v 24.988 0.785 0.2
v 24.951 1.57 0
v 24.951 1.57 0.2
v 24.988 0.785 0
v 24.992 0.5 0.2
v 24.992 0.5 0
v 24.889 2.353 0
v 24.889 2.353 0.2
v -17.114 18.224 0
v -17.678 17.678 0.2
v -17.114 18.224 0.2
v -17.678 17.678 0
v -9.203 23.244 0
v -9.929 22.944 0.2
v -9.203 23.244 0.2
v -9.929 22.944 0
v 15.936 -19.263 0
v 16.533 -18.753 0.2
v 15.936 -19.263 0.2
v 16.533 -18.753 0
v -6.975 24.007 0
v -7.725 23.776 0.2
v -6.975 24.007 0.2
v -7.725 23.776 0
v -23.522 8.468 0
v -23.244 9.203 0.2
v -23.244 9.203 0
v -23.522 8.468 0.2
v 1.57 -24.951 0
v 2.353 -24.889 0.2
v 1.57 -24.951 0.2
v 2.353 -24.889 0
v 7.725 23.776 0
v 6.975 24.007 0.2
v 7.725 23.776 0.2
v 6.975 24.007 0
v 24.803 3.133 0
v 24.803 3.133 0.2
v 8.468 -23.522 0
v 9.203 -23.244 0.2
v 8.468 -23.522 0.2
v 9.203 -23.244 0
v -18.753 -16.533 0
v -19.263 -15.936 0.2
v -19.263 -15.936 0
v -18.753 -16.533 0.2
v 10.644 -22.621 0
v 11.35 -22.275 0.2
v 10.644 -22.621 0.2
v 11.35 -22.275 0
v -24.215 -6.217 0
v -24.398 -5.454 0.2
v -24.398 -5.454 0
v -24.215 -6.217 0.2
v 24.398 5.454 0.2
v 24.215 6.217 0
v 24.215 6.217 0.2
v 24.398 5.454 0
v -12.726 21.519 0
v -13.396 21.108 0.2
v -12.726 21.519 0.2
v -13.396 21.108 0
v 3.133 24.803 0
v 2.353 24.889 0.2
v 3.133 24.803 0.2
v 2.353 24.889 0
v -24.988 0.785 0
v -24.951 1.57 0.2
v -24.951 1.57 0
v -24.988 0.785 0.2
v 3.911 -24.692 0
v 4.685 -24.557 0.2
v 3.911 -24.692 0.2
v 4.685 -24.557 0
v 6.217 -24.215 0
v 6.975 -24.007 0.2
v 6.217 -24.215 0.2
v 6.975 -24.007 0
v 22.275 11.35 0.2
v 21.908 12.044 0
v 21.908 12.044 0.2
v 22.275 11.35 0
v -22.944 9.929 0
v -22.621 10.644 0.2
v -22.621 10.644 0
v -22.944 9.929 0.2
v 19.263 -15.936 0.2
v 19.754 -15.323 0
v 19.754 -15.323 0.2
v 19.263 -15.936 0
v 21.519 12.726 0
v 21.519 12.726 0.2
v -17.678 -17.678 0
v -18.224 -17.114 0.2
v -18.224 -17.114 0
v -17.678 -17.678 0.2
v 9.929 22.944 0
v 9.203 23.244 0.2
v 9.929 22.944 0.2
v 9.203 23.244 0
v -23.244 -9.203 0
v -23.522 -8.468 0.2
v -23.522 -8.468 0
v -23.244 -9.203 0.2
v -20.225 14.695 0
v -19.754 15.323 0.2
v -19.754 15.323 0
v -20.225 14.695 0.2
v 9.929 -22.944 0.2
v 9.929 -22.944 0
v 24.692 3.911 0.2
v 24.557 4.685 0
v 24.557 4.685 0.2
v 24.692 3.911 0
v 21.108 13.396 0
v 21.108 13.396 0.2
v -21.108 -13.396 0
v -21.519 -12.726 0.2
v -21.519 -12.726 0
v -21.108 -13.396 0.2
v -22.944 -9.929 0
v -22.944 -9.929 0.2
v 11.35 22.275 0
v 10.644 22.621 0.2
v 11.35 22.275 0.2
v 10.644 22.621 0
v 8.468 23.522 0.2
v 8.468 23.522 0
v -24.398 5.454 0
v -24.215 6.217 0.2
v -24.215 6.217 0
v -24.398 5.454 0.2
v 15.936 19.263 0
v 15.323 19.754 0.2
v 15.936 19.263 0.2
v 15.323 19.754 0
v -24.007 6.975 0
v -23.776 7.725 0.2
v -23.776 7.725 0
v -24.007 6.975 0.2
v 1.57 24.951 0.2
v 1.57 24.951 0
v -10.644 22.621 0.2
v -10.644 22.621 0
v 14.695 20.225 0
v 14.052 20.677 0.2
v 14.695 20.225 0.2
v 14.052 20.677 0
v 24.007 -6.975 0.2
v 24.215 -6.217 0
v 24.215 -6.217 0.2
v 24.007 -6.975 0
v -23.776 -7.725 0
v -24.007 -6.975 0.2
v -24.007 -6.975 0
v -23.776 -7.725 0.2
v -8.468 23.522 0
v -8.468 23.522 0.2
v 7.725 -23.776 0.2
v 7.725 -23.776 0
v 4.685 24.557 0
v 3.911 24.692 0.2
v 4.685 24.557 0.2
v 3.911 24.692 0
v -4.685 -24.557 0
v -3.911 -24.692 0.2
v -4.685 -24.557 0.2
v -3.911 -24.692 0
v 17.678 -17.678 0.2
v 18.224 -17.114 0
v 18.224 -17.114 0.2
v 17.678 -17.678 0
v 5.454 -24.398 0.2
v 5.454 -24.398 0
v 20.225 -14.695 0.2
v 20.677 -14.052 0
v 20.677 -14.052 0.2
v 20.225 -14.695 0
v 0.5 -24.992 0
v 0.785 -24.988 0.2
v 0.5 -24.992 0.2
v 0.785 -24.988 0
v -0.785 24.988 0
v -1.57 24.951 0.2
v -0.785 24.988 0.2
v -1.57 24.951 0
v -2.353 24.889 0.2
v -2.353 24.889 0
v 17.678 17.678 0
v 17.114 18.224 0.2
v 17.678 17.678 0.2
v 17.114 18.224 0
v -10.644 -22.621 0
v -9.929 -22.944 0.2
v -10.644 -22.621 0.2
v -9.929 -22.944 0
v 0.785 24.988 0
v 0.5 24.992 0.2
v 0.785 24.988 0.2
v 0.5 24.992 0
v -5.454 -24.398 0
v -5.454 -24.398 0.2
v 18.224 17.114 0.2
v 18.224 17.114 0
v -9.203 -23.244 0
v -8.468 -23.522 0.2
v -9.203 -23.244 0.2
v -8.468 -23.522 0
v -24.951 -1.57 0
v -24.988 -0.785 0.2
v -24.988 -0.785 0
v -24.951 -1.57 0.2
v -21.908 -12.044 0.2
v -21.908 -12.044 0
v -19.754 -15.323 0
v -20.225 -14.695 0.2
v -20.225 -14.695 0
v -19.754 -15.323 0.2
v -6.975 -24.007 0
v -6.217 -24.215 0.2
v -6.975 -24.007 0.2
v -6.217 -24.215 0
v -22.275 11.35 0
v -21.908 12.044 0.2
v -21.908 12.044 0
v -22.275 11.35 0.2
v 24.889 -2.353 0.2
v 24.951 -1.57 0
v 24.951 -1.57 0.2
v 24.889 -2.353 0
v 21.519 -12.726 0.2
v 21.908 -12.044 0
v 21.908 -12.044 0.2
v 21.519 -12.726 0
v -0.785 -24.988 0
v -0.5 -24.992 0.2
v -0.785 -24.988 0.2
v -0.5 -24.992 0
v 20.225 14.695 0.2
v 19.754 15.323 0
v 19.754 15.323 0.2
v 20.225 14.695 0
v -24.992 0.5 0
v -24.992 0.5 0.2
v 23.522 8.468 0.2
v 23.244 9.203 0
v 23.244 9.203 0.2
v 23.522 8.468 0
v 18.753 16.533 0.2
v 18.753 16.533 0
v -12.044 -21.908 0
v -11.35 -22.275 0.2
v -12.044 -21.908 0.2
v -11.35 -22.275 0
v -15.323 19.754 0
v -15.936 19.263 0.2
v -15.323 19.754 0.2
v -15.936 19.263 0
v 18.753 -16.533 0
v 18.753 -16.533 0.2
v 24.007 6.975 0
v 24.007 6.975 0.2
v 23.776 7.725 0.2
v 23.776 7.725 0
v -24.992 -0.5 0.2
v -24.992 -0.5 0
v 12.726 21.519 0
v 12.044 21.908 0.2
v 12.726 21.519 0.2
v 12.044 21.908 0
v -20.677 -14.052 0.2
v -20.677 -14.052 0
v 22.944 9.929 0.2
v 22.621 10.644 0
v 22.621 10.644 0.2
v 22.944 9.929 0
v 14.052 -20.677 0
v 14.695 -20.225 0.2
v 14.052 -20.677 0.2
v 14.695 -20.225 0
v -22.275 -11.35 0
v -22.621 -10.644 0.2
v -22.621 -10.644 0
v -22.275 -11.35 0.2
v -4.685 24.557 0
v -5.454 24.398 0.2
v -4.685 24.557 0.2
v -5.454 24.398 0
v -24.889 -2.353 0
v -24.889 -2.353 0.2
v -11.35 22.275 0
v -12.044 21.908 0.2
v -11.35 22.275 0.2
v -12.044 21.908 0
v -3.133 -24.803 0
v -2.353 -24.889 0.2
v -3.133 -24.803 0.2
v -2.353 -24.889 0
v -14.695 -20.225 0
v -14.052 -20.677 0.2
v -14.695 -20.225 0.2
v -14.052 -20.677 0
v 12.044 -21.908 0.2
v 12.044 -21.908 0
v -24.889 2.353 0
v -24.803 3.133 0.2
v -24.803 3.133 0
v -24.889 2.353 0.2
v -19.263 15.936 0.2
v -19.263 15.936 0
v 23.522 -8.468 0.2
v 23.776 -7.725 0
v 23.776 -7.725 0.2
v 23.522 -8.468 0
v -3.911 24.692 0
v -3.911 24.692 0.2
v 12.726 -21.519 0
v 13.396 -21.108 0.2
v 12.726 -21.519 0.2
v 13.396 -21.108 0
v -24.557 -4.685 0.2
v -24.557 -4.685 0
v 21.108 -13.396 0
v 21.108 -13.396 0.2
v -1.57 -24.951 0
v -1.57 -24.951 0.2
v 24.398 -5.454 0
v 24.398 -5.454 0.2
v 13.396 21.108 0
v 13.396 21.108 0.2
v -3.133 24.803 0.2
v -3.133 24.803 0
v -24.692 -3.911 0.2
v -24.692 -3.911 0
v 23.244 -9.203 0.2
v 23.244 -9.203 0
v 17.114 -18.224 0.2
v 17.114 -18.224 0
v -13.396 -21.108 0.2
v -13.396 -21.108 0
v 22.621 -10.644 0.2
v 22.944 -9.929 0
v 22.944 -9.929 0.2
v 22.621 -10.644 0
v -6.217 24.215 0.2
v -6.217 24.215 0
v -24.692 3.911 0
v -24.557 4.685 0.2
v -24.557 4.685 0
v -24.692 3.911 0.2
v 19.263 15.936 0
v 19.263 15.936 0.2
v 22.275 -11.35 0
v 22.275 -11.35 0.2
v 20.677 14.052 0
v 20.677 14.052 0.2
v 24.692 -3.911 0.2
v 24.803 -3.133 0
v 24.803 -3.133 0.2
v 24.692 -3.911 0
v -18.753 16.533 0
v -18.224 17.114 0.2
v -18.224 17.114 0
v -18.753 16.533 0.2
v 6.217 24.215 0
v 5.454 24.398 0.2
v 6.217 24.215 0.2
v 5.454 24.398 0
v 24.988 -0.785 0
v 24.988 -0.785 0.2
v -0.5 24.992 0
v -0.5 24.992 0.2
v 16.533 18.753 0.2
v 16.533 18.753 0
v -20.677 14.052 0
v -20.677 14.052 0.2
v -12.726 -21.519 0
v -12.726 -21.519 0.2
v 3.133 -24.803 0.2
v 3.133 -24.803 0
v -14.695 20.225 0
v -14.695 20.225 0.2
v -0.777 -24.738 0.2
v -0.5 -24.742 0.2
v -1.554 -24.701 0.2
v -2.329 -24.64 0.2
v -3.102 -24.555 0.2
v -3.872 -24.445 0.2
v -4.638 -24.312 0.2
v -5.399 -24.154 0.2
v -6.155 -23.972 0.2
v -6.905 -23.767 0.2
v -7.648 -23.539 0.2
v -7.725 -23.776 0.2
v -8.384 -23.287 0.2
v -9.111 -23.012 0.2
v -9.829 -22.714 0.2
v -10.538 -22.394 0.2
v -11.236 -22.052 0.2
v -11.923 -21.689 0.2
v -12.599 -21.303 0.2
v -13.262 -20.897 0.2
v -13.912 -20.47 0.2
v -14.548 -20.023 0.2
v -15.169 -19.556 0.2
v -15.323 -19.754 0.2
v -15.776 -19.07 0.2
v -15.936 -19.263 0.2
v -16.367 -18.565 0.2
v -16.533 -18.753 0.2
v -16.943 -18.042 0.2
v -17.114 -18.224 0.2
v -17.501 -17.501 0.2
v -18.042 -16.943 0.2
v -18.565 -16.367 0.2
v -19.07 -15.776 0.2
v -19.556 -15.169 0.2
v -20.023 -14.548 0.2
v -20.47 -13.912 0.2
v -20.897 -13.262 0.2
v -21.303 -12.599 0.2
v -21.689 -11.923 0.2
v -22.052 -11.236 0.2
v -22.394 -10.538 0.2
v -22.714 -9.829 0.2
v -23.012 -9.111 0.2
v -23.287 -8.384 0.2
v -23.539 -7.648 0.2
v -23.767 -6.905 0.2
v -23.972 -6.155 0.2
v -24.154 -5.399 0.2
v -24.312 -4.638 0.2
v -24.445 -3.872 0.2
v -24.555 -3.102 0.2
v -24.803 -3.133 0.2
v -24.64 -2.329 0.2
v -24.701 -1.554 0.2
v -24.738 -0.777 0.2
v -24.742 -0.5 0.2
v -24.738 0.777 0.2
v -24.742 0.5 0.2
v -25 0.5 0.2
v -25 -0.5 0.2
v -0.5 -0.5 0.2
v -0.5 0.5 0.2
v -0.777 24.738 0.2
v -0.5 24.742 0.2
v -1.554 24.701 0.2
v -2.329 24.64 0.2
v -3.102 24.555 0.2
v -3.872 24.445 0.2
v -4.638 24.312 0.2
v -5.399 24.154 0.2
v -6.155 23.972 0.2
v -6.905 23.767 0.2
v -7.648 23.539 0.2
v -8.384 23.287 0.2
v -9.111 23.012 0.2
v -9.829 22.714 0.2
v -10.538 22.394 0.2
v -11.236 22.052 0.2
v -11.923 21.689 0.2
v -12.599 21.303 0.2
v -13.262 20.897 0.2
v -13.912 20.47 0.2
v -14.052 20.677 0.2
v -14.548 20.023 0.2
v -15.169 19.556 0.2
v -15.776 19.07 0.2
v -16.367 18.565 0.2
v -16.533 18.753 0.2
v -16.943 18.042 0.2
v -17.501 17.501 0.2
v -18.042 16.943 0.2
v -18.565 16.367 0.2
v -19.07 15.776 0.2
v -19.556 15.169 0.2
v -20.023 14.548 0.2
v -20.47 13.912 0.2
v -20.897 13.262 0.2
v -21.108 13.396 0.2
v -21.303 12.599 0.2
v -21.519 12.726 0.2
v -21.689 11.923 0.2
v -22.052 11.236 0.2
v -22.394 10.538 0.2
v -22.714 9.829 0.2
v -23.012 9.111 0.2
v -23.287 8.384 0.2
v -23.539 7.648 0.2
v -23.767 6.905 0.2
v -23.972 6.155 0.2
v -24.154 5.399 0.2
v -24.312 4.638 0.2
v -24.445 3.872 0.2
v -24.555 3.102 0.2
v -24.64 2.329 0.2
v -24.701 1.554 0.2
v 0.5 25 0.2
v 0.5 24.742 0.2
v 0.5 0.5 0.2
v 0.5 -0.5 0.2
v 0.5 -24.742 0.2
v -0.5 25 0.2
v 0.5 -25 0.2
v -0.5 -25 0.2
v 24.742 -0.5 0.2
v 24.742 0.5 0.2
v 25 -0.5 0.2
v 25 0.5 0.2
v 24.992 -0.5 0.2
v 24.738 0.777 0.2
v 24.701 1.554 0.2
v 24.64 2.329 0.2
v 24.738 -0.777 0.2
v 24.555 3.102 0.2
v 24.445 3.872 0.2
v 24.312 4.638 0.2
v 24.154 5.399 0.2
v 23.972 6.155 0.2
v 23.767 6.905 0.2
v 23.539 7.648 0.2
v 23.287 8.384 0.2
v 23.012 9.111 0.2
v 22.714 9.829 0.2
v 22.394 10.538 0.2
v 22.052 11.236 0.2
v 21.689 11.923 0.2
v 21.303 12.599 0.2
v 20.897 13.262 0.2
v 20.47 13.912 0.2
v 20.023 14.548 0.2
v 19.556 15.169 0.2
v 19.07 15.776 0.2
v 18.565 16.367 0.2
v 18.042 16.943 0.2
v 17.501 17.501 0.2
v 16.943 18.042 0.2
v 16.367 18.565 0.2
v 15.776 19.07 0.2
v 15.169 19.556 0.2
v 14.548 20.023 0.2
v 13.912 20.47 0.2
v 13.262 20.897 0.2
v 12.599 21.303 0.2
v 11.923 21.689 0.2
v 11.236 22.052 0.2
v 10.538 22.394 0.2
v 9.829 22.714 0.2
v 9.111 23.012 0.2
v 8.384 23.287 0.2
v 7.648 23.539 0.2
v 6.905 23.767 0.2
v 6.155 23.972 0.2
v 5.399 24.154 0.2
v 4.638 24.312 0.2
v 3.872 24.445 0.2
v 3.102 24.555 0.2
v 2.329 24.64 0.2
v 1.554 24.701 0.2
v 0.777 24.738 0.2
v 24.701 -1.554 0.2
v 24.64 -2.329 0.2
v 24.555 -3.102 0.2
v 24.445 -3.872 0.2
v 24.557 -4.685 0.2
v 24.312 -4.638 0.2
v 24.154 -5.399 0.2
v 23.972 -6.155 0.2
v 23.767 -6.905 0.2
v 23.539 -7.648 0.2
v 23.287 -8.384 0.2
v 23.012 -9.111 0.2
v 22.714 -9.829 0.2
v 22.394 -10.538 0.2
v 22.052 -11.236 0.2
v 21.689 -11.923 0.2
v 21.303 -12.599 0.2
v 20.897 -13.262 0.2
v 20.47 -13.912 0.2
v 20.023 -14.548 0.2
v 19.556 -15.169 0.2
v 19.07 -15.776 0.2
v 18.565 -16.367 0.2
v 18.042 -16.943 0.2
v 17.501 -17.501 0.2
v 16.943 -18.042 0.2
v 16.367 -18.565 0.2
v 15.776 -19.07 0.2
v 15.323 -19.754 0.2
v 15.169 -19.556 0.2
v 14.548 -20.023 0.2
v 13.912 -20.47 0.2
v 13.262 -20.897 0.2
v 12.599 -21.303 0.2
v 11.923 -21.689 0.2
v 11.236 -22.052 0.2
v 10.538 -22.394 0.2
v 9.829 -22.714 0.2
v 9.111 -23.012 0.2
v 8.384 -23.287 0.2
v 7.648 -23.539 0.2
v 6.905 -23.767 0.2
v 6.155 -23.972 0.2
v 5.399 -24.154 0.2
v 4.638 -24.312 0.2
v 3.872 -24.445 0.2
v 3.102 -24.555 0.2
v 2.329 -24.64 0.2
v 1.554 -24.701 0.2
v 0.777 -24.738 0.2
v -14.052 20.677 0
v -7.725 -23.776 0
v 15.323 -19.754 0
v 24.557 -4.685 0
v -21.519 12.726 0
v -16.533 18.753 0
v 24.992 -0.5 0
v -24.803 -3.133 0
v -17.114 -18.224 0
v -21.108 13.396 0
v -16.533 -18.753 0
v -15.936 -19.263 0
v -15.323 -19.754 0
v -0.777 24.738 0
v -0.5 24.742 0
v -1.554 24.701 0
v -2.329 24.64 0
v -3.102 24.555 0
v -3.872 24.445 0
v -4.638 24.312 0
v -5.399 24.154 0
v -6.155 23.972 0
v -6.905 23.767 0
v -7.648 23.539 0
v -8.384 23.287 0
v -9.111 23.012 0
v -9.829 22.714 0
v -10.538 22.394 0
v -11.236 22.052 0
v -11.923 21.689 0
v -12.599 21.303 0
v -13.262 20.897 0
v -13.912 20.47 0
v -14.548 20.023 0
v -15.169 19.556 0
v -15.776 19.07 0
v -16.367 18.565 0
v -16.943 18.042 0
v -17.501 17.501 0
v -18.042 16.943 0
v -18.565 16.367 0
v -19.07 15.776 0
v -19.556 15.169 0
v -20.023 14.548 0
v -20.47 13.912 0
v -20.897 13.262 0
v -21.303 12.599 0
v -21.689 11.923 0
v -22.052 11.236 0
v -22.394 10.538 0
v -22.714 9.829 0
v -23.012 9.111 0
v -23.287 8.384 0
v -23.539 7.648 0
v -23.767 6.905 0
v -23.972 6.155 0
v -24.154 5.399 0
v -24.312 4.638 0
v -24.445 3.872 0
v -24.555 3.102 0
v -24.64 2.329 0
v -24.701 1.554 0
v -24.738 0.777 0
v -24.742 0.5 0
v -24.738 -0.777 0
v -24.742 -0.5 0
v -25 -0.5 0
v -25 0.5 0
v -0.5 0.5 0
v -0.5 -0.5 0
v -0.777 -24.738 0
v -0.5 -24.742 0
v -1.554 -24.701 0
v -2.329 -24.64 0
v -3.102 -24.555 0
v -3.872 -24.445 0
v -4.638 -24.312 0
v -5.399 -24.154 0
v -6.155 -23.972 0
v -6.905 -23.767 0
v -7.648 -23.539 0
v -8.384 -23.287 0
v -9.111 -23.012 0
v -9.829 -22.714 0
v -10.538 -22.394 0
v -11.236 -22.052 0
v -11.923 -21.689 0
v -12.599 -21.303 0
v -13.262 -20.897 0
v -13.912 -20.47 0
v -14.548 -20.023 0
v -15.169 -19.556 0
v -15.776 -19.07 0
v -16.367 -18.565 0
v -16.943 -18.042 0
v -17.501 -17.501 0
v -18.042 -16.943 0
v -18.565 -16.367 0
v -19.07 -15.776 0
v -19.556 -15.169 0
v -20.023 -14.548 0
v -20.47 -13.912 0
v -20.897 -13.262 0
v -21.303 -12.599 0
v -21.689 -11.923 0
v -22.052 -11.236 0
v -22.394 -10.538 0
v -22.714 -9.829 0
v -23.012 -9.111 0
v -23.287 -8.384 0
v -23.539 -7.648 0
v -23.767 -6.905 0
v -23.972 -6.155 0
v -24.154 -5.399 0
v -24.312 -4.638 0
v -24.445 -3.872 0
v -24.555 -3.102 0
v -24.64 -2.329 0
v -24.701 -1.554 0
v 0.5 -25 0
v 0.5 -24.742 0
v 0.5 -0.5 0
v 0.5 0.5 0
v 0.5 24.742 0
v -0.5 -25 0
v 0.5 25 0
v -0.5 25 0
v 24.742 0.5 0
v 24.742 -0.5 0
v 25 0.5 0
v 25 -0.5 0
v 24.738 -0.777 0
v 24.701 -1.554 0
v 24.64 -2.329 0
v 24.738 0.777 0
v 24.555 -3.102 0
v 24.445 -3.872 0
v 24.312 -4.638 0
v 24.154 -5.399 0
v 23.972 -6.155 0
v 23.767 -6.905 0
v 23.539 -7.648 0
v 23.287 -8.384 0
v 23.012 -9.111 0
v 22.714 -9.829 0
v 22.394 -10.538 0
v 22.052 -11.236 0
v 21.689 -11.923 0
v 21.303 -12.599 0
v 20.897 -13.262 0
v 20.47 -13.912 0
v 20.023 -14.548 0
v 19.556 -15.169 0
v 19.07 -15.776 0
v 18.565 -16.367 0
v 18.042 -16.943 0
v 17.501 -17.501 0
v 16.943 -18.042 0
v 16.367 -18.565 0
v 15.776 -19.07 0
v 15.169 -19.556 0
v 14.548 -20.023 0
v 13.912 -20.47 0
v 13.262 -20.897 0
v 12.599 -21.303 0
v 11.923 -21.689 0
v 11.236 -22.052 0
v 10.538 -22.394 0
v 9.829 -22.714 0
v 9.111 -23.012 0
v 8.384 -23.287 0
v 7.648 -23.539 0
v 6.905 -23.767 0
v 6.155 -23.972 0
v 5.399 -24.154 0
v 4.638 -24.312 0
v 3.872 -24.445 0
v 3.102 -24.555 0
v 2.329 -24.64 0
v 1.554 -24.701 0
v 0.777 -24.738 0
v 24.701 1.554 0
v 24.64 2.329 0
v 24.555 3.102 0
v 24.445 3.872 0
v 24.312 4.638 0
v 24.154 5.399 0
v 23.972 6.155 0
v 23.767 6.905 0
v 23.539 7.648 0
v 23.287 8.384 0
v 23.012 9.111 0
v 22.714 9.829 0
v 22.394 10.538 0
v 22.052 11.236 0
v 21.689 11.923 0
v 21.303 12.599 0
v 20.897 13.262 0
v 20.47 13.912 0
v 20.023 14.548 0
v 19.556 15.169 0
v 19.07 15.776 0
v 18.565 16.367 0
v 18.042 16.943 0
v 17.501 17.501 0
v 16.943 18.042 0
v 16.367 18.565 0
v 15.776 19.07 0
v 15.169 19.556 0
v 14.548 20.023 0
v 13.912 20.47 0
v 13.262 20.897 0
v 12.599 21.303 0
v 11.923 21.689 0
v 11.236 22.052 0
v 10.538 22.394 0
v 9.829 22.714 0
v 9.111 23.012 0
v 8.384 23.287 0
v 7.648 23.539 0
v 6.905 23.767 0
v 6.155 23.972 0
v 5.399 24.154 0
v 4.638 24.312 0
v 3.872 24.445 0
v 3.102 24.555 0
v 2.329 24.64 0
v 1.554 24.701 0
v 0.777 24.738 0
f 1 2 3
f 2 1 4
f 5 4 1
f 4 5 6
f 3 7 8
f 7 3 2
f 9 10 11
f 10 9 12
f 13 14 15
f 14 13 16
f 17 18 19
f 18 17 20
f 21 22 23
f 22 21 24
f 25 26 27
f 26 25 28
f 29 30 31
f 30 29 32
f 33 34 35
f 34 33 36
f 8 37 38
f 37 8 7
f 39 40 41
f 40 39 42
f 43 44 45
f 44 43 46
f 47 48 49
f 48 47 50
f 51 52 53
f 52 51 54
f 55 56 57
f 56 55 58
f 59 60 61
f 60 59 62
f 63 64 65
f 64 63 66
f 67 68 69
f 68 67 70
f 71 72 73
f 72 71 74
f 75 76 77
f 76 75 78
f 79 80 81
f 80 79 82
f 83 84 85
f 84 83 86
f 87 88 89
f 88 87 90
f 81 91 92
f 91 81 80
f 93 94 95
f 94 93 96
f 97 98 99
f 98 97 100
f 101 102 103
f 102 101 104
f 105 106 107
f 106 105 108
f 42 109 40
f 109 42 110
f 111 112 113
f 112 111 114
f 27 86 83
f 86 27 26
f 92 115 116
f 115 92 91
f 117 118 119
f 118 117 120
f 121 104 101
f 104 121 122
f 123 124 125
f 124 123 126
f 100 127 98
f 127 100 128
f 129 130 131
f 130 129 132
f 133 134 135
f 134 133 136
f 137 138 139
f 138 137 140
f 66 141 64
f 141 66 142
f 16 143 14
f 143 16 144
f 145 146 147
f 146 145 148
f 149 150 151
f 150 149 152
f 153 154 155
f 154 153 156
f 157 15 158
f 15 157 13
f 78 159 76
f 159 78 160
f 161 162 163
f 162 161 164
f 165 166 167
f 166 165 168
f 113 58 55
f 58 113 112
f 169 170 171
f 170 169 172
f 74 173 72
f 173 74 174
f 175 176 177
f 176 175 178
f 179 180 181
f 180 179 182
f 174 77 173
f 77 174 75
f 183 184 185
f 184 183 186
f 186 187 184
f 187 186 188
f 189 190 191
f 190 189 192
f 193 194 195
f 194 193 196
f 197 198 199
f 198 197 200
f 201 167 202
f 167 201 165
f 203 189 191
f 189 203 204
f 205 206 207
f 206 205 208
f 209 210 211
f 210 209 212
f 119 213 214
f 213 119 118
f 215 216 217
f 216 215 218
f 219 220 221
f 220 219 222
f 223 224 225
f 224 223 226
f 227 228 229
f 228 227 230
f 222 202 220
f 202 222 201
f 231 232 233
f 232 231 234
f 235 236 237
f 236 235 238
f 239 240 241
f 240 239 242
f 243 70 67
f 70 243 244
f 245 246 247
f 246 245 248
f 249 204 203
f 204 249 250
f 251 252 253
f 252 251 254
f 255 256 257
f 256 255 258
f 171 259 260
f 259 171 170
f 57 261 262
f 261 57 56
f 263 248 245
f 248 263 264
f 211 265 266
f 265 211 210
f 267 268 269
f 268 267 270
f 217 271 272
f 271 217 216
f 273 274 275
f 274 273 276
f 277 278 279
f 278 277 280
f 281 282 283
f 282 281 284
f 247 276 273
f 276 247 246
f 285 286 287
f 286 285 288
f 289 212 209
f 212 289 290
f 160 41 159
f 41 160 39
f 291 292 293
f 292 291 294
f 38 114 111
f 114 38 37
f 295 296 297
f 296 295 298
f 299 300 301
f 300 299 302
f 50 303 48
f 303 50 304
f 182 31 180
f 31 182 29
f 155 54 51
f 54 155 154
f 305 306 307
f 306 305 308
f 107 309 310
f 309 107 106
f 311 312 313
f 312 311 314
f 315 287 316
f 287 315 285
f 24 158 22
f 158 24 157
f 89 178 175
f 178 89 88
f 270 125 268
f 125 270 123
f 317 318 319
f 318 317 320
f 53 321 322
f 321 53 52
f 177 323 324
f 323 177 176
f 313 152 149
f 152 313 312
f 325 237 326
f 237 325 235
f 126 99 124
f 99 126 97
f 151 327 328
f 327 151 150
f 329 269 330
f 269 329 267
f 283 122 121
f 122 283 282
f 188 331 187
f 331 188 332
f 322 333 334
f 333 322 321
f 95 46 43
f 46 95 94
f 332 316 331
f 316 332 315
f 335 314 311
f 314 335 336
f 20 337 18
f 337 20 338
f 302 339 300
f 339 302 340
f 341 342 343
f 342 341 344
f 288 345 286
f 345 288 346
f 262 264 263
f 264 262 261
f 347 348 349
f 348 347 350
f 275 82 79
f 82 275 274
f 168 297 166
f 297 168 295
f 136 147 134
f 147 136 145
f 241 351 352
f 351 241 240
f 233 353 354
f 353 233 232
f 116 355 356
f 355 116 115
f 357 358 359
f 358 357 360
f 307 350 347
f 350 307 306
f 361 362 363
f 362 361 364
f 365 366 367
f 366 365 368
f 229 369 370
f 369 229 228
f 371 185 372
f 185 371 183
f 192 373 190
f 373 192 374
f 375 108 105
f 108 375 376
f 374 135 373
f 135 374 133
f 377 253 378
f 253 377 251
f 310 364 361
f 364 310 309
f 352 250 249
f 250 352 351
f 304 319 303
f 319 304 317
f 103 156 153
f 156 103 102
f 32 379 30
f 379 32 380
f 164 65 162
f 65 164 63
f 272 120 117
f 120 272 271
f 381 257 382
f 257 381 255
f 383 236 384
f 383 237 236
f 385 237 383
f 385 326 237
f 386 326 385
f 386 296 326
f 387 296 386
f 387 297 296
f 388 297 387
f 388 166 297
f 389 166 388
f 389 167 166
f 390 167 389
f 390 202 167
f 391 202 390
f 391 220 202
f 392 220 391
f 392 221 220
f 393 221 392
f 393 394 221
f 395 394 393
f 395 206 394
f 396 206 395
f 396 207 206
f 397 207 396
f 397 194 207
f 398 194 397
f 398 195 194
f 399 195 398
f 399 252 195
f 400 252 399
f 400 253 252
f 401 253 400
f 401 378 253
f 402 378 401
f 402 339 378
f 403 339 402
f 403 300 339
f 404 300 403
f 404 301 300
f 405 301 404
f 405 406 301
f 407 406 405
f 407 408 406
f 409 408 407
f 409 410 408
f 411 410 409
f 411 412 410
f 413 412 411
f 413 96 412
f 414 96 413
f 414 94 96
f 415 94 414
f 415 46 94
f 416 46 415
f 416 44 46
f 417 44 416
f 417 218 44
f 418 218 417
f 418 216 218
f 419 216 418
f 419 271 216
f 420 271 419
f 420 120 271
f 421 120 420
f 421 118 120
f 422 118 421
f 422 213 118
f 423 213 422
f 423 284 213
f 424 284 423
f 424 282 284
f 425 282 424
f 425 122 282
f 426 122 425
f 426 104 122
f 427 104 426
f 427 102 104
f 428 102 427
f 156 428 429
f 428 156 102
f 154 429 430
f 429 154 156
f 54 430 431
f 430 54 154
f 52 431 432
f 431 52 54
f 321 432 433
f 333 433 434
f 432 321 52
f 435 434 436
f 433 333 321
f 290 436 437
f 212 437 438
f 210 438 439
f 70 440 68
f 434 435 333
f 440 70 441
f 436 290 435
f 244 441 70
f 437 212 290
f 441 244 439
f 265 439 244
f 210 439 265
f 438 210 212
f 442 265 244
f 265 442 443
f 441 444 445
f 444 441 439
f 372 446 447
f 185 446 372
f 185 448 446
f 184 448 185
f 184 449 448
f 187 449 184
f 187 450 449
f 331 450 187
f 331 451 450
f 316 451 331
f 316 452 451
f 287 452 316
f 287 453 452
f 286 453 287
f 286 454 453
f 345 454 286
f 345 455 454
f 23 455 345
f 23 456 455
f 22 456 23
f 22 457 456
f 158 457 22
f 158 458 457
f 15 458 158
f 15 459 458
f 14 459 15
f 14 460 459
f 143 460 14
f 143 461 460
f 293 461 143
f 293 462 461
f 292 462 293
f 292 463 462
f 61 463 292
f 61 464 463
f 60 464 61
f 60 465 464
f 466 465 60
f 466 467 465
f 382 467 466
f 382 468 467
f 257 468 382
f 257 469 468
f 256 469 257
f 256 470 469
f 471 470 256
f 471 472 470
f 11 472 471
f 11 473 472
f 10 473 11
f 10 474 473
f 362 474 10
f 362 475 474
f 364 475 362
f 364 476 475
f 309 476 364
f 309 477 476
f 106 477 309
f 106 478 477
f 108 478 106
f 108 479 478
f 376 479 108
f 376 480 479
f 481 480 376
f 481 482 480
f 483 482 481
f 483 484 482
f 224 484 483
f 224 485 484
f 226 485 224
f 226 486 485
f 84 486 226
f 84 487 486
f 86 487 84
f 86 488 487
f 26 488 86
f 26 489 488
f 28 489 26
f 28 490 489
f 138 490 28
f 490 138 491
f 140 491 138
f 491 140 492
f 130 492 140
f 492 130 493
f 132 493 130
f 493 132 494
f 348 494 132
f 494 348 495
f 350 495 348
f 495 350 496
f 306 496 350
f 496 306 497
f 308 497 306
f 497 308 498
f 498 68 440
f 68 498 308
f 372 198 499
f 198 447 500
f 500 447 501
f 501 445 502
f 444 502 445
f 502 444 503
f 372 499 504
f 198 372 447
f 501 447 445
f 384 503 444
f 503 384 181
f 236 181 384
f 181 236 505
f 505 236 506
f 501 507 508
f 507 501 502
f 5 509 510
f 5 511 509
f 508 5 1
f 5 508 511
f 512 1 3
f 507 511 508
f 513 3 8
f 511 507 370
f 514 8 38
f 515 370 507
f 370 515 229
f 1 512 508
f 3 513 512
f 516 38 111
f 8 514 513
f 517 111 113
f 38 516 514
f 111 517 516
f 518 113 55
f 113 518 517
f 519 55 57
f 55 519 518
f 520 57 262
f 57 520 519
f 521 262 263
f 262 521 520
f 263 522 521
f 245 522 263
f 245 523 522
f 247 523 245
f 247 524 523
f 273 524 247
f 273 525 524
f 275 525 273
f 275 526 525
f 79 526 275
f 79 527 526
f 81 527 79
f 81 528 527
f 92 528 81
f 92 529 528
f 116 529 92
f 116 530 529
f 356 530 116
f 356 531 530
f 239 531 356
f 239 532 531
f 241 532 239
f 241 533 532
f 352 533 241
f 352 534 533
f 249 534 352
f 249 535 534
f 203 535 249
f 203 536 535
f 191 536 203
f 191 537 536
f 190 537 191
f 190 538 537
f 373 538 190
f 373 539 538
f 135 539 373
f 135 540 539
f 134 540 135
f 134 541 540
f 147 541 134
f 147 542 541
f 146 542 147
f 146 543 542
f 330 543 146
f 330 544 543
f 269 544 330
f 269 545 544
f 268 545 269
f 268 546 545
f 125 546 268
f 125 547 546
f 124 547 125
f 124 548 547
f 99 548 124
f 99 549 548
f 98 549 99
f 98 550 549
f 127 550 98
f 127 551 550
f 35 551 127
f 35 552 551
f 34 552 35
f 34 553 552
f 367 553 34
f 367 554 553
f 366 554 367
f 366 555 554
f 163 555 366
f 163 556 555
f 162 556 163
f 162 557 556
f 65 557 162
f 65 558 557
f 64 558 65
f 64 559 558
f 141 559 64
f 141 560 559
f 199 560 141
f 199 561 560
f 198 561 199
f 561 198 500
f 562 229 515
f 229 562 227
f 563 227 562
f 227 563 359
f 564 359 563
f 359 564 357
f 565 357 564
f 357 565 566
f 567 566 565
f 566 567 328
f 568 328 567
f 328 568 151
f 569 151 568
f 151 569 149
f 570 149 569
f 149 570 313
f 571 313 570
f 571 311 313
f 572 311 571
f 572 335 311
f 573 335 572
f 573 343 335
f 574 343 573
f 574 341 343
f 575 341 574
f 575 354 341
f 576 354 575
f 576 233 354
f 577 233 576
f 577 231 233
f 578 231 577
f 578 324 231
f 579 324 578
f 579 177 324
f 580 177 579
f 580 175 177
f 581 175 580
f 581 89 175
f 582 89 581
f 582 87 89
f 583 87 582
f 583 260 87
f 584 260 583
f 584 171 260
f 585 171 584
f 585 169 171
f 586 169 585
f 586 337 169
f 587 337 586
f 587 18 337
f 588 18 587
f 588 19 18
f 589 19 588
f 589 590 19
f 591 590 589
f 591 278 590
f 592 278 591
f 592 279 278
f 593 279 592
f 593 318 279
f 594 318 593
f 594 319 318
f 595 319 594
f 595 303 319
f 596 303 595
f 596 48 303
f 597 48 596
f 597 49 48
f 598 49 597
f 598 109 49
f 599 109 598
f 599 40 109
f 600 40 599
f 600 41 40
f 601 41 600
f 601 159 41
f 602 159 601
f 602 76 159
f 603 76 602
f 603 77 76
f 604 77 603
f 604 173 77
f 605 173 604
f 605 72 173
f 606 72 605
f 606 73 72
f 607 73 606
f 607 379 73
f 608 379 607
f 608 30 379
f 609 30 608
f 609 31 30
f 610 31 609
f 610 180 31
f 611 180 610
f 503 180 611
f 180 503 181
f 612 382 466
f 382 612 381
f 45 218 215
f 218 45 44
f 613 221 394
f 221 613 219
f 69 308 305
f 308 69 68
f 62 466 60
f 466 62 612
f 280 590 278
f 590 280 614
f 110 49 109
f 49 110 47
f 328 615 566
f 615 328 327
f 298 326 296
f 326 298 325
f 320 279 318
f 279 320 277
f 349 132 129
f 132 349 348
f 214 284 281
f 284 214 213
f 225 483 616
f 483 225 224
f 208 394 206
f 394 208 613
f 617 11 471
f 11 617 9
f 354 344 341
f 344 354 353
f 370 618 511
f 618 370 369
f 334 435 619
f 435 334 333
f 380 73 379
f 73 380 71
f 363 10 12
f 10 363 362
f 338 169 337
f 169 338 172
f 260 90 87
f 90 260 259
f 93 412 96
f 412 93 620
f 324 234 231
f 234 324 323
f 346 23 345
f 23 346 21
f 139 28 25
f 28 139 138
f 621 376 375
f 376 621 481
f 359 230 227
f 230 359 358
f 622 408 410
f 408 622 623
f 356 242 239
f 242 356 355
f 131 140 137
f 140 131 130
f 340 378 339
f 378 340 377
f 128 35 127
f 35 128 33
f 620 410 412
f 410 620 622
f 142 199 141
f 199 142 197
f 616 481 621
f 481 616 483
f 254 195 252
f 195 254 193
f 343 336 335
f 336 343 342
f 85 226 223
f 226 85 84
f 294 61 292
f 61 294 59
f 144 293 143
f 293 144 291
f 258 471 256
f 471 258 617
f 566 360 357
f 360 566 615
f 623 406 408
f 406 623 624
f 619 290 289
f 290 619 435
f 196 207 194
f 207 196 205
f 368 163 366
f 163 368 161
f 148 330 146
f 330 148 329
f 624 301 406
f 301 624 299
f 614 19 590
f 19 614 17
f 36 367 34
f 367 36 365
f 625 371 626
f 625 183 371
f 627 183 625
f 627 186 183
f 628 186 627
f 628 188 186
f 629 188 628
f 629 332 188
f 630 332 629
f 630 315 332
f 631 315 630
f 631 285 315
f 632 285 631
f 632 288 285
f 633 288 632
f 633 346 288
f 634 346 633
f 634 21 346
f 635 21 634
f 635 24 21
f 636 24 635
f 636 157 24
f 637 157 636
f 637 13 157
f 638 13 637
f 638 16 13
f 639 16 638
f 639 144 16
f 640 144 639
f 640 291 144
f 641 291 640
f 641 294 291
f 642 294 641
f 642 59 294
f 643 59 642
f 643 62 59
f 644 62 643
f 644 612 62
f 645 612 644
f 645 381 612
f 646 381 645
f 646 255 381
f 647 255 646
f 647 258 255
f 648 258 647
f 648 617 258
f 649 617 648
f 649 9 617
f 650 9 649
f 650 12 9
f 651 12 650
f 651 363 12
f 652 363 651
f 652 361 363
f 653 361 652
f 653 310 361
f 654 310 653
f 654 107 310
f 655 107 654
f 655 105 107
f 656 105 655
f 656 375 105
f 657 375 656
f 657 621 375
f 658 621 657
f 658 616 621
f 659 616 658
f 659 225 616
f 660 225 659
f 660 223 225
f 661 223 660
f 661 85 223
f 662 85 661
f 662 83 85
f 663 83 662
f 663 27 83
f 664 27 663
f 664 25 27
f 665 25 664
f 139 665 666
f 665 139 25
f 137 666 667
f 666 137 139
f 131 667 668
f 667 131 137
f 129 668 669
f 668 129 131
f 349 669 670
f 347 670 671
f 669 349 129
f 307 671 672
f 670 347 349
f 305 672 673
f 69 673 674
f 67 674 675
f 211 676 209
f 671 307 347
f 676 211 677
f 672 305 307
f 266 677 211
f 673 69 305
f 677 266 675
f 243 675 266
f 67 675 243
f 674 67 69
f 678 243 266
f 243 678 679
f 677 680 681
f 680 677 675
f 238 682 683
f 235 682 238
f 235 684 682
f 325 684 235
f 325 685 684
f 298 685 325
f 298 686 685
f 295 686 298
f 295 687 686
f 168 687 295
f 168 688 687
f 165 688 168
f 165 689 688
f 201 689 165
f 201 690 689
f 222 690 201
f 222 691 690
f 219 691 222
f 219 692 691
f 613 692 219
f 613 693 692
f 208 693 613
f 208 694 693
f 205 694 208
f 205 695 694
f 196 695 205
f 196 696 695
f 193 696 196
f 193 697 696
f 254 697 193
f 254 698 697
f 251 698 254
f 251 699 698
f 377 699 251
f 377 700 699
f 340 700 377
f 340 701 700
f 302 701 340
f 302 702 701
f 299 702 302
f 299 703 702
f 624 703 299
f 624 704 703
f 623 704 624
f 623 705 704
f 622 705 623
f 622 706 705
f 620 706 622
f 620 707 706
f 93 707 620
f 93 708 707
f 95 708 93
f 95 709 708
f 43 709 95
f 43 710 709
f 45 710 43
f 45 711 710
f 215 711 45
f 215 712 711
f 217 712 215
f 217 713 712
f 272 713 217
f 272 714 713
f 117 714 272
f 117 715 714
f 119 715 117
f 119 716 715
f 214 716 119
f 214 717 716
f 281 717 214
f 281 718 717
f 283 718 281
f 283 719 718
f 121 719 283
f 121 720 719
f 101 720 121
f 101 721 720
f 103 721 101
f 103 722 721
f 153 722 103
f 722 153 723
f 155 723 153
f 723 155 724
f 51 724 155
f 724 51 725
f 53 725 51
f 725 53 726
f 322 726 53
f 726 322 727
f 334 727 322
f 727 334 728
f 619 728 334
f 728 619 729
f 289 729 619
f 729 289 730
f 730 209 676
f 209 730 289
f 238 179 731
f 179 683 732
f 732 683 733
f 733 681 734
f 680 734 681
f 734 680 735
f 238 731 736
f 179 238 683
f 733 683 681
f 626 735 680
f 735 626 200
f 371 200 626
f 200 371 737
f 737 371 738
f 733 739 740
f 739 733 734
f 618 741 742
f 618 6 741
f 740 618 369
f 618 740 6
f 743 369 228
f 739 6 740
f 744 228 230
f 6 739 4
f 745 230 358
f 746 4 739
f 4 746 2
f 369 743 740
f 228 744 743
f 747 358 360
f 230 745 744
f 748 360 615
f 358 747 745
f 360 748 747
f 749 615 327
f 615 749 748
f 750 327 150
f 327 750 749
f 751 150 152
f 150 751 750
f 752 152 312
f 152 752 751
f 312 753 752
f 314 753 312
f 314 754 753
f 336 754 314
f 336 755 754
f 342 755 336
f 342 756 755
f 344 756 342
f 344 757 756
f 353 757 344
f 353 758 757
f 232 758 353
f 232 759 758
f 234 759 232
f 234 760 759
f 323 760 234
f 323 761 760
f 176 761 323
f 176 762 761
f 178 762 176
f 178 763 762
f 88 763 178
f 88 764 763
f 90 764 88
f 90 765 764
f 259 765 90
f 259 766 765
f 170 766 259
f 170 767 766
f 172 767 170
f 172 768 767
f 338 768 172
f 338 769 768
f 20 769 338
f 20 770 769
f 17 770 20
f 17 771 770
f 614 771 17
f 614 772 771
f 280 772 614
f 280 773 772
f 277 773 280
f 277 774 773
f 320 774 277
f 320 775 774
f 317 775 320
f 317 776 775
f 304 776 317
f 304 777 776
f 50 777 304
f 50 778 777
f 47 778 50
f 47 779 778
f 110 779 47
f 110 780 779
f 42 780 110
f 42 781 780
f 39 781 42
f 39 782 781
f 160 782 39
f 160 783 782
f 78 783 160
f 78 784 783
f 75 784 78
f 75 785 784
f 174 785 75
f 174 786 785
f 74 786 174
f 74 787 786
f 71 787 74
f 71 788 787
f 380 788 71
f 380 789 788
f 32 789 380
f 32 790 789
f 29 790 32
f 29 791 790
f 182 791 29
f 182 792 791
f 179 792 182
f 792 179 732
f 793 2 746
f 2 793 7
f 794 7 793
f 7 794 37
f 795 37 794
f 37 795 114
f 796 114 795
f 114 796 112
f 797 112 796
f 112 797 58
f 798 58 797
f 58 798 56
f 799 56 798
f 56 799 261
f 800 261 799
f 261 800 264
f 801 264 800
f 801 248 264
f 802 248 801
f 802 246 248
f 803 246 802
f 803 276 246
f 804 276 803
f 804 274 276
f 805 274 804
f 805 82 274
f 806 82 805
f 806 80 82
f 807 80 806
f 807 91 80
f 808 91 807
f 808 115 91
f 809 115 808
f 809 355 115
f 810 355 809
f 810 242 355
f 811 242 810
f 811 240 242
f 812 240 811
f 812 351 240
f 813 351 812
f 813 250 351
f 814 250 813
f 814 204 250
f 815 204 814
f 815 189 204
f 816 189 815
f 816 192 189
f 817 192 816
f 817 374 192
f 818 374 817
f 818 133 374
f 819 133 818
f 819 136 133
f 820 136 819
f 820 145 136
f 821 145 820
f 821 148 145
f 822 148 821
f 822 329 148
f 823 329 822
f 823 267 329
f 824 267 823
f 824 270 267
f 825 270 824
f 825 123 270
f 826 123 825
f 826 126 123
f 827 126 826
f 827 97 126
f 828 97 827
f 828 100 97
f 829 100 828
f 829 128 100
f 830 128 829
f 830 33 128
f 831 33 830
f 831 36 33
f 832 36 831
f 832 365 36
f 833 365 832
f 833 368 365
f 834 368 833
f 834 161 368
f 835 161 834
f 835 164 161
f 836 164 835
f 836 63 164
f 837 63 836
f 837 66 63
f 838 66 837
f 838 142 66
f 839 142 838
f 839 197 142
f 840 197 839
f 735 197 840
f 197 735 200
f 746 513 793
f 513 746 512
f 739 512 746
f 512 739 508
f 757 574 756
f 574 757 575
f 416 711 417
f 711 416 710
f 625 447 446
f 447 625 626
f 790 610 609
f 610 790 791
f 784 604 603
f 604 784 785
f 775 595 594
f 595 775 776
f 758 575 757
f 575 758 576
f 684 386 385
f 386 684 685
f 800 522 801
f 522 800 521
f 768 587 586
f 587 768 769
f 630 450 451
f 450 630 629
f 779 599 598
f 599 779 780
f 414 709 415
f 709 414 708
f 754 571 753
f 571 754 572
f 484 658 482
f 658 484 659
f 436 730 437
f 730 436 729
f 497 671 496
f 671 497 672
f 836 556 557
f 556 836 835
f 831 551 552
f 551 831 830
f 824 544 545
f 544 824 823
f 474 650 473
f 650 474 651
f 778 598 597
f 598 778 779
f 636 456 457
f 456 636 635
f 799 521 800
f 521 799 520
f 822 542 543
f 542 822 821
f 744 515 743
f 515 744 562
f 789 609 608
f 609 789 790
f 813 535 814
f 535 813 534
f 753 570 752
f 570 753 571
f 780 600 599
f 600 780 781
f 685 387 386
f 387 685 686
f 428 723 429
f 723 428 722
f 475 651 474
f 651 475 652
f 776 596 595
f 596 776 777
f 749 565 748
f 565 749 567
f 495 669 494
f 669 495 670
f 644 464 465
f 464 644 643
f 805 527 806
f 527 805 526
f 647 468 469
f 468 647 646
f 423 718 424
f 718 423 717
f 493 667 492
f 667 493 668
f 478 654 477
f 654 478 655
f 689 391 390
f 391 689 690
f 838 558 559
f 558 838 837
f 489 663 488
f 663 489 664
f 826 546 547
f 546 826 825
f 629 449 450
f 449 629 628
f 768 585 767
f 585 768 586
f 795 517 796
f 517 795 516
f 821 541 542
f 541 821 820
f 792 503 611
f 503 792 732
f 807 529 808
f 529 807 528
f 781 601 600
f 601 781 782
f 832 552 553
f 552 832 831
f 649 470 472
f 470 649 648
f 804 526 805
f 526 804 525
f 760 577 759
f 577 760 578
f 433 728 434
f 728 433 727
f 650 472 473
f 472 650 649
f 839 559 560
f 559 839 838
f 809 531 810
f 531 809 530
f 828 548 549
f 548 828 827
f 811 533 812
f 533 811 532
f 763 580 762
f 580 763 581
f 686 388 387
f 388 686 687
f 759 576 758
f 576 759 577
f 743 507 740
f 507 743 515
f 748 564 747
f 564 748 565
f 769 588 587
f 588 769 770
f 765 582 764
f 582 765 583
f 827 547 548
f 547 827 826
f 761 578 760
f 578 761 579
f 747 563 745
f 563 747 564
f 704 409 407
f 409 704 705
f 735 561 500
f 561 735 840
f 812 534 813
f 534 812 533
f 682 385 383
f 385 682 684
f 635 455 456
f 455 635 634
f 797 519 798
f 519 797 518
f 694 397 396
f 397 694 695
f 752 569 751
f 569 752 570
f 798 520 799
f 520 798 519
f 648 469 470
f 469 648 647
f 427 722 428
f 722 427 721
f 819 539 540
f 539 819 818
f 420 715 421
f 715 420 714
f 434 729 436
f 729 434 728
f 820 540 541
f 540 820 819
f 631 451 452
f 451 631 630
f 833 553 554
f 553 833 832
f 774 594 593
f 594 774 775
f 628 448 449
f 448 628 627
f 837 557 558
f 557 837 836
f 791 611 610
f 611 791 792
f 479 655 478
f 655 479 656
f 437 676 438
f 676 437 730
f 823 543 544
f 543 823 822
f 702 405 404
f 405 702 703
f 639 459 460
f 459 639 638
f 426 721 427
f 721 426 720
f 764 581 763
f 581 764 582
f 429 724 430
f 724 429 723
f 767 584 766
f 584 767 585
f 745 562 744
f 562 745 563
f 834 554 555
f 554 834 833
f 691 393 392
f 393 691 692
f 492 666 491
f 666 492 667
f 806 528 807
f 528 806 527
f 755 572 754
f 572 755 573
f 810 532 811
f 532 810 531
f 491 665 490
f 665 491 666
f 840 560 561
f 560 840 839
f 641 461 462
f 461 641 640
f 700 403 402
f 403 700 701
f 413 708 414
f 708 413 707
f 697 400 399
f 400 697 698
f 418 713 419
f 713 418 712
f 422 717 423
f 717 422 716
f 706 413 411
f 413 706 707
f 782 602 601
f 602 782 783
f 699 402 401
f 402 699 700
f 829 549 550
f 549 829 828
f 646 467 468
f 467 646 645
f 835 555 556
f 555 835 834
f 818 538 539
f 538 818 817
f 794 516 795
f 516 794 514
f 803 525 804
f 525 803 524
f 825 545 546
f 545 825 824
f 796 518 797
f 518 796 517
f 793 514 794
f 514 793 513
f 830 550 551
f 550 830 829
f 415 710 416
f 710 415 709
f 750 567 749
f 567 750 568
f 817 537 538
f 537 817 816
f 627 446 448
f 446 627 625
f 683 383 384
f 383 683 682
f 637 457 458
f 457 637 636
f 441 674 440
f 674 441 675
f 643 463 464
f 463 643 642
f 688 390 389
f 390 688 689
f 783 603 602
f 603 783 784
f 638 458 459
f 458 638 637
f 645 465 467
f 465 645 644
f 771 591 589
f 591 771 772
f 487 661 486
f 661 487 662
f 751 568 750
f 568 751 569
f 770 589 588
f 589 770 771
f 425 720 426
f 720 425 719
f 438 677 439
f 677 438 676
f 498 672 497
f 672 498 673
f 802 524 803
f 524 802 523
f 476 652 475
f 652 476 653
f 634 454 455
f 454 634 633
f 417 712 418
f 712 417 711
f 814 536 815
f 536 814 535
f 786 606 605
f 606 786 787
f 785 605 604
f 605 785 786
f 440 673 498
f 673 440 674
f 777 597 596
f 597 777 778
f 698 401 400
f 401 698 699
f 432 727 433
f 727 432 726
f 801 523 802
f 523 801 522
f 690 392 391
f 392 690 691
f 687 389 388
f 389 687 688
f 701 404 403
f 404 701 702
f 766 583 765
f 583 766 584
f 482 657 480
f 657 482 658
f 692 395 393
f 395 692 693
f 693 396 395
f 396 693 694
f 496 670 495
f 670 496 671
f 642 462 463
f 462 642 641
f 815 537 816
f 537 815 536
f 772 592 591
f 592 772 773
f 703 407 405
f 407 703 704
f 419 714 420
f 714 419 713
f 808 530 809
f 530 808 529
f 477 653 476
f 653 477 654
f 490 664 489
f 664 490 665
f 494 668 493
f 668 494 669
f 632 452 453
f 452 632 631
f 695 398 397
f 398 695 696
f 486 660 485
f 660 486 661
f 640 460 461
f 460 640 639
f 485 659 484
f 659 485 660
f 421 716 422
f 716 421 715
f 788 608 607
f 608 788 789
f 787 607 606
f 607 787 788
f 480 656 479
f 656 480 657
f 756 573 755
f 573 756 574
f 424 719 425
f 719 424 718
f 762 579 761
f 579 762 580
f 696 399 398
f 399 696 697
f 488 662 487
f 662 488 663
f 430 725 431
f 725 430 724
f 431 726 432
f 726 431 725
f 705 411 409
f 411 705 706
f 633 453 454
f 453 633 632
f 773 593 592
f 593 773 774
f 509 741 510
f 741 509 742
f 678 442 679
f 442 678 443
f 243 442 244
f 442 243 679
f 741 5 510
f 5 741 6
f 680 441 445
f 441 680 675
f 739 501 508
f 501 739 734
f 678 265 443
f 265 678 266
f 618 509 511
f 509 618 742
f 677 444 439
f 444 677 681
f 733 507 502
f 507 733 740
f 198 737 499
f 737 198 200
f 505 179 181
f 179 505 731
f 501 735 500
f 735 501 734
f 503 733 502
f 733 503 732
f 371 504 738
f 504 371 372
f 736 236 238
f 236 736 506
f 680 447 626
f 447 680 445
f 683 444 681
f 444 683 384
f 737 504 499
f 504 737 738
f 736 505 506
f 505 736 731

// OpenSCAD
d = 50;
h=0.2;
$fn=200;

difference()
{
cylinder(d=d, h=h);
translate([0,0,-h/2]) cylinder(d=d-0.5, h=2*h);
}
translate([0,0,h/2]) cube([d,1,h],center=true);
translate([0,0,h/2]) cube([1,d,h],center=true);
